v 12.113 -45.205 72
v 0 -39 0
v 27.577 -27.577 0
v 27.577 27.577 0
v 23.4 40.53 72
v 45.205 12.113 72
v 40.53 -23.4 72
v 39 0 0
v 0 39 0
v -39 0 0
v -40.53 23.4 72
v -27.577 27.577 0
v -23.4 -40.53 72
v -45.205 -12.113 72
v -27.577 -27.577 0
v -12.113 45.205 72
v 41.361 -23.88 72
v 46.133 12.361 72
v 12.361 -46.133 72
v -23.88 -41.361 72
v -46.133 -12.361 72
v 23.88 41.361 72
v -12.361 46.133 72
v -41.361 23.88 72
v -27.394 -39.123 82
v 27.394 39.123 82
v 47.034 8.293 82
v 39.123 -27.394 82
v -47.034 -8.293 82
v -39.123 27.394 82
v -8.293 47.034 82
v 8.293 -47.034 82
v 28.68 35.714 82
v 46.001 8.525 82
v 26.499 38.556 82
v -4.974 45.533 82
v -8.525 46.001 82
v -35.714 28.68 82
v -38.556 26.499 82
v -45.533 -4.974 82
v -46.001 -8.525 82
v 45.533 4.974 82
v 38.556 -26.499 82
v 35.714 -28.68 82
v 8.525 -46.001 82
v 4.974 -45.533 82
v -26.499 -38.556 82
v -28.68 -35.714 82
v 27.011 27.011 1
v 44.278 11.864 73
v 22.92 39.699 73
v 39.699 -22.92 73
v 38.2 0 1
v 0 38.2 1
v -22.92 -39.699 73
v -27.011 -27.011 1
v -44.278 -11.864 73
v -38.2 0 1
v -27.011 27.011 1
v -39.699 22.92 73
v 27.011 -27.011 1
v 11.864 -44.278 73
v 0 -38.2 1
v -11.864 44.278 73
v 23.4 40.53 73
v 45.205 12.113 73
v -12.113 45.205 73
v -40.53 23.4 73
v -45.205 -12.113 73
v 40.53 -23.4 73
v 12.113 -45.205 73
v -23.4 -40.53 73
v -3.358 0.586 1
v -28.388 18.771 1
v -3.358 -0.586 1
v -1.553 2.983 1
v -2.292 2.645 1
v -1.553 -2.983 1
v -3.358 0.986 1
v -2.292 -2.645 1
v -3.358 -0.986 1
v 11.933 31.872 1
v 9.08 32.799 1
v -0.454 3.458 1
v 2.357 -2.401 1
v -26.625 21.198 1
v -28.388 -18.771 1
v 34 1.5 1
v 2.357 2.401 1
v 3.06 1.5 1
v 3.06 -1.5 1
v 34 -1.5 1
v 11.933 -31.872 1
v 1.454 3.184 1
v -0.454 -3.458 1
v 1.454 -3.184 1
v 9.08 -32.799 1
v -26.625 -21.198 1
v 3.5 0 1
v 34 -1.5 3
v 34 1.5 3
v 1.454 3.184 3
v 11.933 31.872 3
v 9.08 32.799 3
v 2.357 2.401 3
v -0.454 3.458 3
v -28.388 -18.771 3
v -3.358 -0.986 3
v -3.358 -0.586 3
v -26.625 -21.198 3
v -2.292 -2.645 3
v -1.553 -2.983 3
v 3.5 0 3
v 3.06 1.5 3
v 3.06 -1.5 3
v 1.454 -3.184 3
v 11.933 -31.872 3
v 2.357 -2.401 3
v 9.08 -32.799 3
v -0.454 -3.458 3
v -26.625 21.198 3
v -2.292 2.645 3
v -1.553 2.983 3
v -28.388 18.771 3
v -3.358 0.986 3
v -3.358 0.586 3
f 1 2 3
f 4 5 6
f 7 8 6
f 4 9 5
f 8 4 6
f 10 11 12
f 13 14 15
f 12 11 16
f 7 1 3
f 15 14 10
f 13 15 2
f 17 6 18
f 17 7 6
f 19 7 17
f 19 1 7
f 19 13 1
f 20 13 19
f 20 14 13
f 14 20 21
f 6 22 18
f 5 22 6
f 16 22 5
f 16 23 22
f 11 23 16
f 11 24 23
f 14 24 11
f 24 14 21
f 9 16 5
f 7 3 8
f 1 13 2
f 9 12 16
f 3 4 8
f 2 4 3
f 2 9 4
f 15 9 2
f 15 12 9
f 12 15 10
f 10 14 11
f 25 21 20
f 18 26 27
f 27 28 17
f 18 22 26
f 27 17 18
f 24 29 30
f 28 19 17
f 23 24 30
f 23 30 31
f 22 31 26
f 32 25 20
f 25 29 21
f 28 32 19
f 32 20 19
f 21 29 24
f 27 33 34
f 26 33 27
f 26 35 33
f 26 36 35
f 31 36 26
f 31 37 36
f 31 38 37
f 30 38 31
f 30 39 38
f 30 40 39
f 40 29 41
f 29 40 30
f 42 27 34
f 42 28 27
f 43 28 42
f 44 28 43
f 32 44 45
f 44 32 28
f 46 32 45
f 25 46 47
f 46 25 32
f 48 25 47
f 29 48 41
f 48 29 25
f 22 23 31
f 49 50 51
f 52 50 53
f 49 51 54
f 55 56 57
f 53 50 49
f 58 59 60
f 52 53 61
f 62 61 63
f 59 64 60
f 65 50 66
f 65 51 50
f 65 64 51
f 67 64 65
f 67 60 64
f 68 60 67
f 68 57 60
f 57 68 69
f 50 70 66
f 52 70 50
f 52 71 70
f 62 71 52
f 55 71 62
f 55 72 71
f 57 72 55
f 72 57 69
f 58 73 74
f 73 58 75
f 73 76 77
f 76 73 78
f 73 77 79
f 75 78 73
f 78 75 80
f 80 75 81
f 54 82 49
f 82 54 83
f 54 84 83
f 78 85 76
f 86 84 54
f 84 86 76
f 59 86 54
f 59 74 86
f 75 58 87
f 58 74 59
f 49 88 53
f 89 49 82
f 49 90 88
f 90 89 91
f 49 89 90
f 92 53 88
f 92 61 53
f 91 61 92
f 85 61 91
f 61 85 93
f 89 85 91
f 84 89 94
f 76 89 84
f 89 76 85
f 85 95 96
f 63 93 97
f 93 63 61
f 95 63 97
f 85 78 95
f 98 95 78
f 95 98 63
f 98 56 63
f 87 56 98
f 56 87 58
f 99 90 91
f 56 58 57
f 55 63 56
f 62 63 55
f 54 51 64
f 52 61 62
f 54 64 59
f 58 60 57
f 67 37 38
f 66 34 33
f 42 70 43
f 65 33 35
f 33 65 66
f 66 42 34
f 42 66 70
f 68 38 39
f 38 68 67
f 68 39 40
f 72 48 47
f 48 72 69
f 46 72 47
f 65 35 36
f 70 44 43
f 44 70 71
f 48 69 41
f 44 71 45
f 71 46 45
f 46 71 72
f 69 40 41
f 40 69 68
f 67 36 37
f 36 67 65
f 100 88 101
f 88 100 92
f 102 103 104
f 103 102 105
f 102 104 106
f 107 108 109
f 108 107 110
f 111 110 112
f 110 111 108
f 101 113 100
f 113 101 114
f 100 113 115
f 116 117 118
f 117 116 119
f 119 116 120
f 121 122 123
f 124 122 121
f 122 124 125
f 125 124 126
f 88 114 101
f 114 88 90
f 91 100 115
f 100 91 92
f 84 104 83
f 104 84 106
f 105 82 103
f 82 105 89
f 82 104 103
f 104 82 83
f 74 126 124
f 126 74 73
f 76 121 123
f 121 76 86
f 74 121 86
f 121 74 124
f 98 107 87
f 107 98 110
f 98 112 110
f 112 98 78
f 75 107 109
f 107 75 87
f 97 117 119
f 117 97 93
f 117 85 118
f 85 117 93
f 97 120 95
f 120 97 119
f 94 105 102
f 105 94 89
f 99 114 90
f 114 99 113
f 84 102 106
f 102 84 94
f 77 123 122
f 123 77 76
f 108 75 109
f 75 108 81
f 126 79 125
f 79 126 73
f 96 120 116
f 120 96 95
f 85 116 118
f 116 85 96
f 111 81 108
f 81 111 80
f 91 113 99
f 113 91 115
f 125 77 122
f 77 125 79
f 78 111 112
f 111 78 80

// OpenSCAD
// Do you want to have a drain hole? In case of a saucer set to Yes if you have a drainhole in the pot
Drain_hole = "Yes"; //[Yes,No]
// Do you want to have risers (only for saucers, see desciption)
Pot_risers = "Yes"; //[Yes,No]
// Vase mode , Drain Holde = 0 !
Vase_mode = "No"; //[Yes,No]
/*[Bottom Part settings]*/
// Defines the thickness of the bottom part of your Pot
Bottom_Thickness = 1;
// Wall Thickness of the bottom part in mm
Wall_thickness_low = 0.8;
// Diameter of the bottom part in mm
Lower_Diameter = 78;
// Defines the angle of the walls in the X Direction(1 = 90degees)
Scale_X_Direction = 1.2;
// Defines the angle of the walls in the X Direction(1 = 90degrees)
Scale_Y_Direction = 1.2;
// Hight of the Bottom Part / Base
base_height = 72;
// When the pot shouldbe twisted insert here an angle between 20 and 40 or 0
Twist_angle = 30;
// sides of the bottom Part, the more sides, the rounder it is
Sides_of_the_base = 8; //[3:100]
// diameter of the Drainhole in mm
Drain_Hole_Diameter = 7;
/*[Hidden]*/
/*[Rim settings]*/
// hightof your rim in mm
Rim_hight = 10;
// Defines the distance therim shouldpoint out in mm (0=no rim)
Rim_thickness = 0.8;
// angle of the rim in X direction(1 = 90�)
Rim_scale_X_Direction = 1;
// angle of the rim in Y direction(1 = 90�)
Rim_scale_Y_Direction = 1;
// defines the Angle of the twist in the rim in degrees
twist_angle_rim = 5;
/*[Hidden]*/
/*[Pot riser Settings]*/
// Number of risers (default = 5)
Number_of_pot_risers = 5;
// hight of the risers in mm
riser_hight = 2;
/*[Hidden]*/

Wall_thickness = Vase_mode == "No" ? Wall_thickness_low : ((Lower_Diameter/2)+ Rim_thickness);
rim_mode = Vase_mode == "No" ? 0 : Lower_Diameter/2;
//echo((((360 / Sides_of_the_base) / 2)+ fine_tune_rim));
union(){
  difference() {
    difference() {
      union(){
        linear_extrude( height=base_height, twist=Twist_angle, scale=[Scale_X_Direction, Scale_Y_Direction], center=false){
          {
            $fn=Sides_of_the_base;    //set sides to Sides_of_the_base
            circle(r=(Lower_Diameter / 2));
          }
        }
        translate([0, 0, base_height]){
          linear_extrude( height=Rim_hight, twist=twist_angle_rim, scale=[Rim_scale_X_Direction, Rim_scale_Y_Direction], center=false){
            scale([Scale_X_Direction, Scale_Y_Direction, 1]){
              if (Twist_angle == 0) {
                {
                  $fn=Sides_of_the_base;    //set sides to Sides_of_the_base
                  circle(r=(Lower_Diameter / 2 + Rim_thickness));
                }
              } else {
                rotate([0, 0, Twist_angle*-1]){
                  {
                    $fn=Sides_of_the_base;    //set sides to Sides_of_the_base
                    circle(r=(Lower_Diameter / 2 + Rim_thickness));
                  }
                }
              }

            }
          }
        }
      }

      translate([0, 0, Bottom_Thickness]){
        union(){
          linear_extrude( height=base_height, twist=Twist_angle, scale=[Scale_X_Direction, Scale_Y_Direction], center=false){
            {
              $fn=Sides_of_the_base;    //set sides to Sides_of_the_base
              circle(r=(Lower_Diameter / 2 - Wall_thickness));
            }
          }
          translate([0, 0, base_height]){
            linear_extrude( height=Rim_hight, twist=twist_angle_rim, scale=[Rim_scale_X_Direction, Rim_scale_Y_Direction], center=false){
              scale([Scale_X_Direction, Scale_Y_Direction, 1]){
                if (Twist_angle == 0) {
                  {
                    $fn=Sides_of_the_base;    //set sides to Sides_of_the_base
                    circle(r=(Lower_Diameter / 2 - rim_mode));
                  }
                } else {
                  rotate([0, 0, Twist_angle*-1]){
                    {
                      $fn=Sides_of_the_base;    //set sides to Sides_of_the_base
                      circle(r=(Lower_Diameter / 2 - rim_mode));
                    }
                  }
                }

              }
            }
          }
        }
      }
    }

    if (Drain_hole == "Yes" && Pot_risers == "No") {
      cylinder(r1=(Drain_Hole_Diameter / 2), r2=(Drain_Hole_Diameter / 2), h=1000, center=true);
    }

  }
  if (Pot_risers == "Yes") {
    difference() {
      for (i = [0 : abs(1) : Number_of_pot_risers]) {
        rotate([0, 0, ((360 / Number_of_pot_risers) * i)]){
          translate([0, -1.5, Bottom_Thickness]){
            cube([((Lower_Diameter - 10) / 2), 3, riser_hight], center=false);
          }
        }
      }

      if (Drain_hole == "Yes") {
          translate([0,0,(Bottom_Thickness*(1))]){
        cylinder(r1=(Drain_Hole_Diameter / 2), r2=(Drain_Hole_Diameter / 2), h=1000, center=false);
      }}

    }
  }

}
